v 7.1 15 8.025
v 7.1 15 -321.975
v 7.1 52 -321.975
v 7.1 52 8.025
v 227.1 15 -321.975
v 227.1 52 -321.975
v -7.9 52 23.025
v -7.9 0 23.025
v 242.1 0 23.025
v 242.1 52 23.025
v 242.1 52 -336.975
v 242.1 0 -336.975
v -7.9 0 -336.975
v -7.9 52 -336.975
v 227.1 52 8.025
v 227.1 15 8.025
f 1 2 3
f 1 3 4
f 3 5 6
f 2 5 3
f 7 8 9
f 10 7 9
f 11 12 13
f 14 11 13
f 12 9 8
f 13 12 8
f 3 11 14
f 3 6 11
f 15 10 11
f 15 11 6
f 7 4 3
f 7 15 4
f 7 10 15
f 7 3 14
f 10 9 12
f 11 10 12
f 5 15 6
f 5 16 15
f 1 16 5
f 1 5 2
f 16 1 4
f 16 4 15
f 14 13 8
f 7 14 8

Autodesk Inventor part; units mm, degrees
ref_plane "YZ Plane" through (0, 0, 0) normal (1, 0, 0) x (0, 1, 0)
ref_plane "XZ Plane" through (0, 0, 0) normal (0, 1, 0) x (-1, 0, 0)
ref_plane "XY Plane" through (0, 0, 0) normal (0, 0, 1) x (1, 0, 0)
sketch "Sketch1" plane through (0, 0, 0) normal (0, 1, 0) x (-1, 0, 0)
  line L0 (7.9003, 23.0254) -> (-242.0997, 23.0254)
  line L1 (-242.0997, 23.0254) -> (-242.0997, -336.9746)
  line L2 (-242.0997, -336.9746) -> (7.9003, -336.9746)
  line L3 (7.9003, -336.9746) -> (7.9003, 23.0254)
  point P0 (0, 0)
  dimension "d0" = 250
  dimension "d1" = 360
extrude "Extrusion1" add sketch "Sketch1" along normal blind 52
shell "Shell1" thickness 15 removed faces 1 at (158.7664, 52, -96.9746)
sketch3d "3D Sketch5"
properties part number "Part1proj" material "Wood (Birch)"
